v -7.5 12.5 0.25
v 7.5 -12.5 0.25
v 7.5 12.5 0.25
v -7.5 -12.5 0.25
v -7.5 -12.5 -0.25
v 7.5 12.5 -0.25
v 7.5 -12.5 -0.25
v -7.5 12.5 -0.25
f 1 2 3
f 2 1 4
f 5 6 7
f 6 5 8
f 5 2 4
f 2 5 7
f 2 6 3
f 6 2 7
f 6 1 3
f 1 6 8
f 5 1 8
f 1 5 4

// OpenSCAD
// file: BOSL2/std.scad
// Minimal BOSL2 compatibility shim for bundled gallery models.
// It implements only the helpers used by the imported OpenSCAD projects.

CENTER = [0, 0, 0];
BOTTOM = [0, 0, -1];
TOP = [0, 0, 1];
LEFT = [-1, 0, 0];
RIGHT = [1, 0, 0];
FRONT = [0, -1, 0];
BACK = [0, 1, 0];

module up(z=0) {
    translate([0, 0, z]) children();
}

module down(z=0) {
    translate([0, 0, -z]) children();
}

module attach(anchor=CENTER) {
    children();
}

module cuboid(size=[1, 1, 1], anchor=CENTER) {
    center = anchor == CENTER;
    translate(center ? [0, 0, 0] : [0, 0, size[2] / 2])
        cube(size, center=true);
    children();
}

module xcyl(h=1, r=1, anchor=CENTER) {
    center = anchor == CENTER;
    translate(center ? [0, 0, 0] : [h / 2, 0, 0])
        rotate([0, 90, 0])
            cylinder(h=h, r=r, center=true);
}
// main file
include <BOSL2/std.scad>


cuboid([15,25,0.5], rounding=5, edges=[BACK+RIGHT,BACK+LEFT]);
